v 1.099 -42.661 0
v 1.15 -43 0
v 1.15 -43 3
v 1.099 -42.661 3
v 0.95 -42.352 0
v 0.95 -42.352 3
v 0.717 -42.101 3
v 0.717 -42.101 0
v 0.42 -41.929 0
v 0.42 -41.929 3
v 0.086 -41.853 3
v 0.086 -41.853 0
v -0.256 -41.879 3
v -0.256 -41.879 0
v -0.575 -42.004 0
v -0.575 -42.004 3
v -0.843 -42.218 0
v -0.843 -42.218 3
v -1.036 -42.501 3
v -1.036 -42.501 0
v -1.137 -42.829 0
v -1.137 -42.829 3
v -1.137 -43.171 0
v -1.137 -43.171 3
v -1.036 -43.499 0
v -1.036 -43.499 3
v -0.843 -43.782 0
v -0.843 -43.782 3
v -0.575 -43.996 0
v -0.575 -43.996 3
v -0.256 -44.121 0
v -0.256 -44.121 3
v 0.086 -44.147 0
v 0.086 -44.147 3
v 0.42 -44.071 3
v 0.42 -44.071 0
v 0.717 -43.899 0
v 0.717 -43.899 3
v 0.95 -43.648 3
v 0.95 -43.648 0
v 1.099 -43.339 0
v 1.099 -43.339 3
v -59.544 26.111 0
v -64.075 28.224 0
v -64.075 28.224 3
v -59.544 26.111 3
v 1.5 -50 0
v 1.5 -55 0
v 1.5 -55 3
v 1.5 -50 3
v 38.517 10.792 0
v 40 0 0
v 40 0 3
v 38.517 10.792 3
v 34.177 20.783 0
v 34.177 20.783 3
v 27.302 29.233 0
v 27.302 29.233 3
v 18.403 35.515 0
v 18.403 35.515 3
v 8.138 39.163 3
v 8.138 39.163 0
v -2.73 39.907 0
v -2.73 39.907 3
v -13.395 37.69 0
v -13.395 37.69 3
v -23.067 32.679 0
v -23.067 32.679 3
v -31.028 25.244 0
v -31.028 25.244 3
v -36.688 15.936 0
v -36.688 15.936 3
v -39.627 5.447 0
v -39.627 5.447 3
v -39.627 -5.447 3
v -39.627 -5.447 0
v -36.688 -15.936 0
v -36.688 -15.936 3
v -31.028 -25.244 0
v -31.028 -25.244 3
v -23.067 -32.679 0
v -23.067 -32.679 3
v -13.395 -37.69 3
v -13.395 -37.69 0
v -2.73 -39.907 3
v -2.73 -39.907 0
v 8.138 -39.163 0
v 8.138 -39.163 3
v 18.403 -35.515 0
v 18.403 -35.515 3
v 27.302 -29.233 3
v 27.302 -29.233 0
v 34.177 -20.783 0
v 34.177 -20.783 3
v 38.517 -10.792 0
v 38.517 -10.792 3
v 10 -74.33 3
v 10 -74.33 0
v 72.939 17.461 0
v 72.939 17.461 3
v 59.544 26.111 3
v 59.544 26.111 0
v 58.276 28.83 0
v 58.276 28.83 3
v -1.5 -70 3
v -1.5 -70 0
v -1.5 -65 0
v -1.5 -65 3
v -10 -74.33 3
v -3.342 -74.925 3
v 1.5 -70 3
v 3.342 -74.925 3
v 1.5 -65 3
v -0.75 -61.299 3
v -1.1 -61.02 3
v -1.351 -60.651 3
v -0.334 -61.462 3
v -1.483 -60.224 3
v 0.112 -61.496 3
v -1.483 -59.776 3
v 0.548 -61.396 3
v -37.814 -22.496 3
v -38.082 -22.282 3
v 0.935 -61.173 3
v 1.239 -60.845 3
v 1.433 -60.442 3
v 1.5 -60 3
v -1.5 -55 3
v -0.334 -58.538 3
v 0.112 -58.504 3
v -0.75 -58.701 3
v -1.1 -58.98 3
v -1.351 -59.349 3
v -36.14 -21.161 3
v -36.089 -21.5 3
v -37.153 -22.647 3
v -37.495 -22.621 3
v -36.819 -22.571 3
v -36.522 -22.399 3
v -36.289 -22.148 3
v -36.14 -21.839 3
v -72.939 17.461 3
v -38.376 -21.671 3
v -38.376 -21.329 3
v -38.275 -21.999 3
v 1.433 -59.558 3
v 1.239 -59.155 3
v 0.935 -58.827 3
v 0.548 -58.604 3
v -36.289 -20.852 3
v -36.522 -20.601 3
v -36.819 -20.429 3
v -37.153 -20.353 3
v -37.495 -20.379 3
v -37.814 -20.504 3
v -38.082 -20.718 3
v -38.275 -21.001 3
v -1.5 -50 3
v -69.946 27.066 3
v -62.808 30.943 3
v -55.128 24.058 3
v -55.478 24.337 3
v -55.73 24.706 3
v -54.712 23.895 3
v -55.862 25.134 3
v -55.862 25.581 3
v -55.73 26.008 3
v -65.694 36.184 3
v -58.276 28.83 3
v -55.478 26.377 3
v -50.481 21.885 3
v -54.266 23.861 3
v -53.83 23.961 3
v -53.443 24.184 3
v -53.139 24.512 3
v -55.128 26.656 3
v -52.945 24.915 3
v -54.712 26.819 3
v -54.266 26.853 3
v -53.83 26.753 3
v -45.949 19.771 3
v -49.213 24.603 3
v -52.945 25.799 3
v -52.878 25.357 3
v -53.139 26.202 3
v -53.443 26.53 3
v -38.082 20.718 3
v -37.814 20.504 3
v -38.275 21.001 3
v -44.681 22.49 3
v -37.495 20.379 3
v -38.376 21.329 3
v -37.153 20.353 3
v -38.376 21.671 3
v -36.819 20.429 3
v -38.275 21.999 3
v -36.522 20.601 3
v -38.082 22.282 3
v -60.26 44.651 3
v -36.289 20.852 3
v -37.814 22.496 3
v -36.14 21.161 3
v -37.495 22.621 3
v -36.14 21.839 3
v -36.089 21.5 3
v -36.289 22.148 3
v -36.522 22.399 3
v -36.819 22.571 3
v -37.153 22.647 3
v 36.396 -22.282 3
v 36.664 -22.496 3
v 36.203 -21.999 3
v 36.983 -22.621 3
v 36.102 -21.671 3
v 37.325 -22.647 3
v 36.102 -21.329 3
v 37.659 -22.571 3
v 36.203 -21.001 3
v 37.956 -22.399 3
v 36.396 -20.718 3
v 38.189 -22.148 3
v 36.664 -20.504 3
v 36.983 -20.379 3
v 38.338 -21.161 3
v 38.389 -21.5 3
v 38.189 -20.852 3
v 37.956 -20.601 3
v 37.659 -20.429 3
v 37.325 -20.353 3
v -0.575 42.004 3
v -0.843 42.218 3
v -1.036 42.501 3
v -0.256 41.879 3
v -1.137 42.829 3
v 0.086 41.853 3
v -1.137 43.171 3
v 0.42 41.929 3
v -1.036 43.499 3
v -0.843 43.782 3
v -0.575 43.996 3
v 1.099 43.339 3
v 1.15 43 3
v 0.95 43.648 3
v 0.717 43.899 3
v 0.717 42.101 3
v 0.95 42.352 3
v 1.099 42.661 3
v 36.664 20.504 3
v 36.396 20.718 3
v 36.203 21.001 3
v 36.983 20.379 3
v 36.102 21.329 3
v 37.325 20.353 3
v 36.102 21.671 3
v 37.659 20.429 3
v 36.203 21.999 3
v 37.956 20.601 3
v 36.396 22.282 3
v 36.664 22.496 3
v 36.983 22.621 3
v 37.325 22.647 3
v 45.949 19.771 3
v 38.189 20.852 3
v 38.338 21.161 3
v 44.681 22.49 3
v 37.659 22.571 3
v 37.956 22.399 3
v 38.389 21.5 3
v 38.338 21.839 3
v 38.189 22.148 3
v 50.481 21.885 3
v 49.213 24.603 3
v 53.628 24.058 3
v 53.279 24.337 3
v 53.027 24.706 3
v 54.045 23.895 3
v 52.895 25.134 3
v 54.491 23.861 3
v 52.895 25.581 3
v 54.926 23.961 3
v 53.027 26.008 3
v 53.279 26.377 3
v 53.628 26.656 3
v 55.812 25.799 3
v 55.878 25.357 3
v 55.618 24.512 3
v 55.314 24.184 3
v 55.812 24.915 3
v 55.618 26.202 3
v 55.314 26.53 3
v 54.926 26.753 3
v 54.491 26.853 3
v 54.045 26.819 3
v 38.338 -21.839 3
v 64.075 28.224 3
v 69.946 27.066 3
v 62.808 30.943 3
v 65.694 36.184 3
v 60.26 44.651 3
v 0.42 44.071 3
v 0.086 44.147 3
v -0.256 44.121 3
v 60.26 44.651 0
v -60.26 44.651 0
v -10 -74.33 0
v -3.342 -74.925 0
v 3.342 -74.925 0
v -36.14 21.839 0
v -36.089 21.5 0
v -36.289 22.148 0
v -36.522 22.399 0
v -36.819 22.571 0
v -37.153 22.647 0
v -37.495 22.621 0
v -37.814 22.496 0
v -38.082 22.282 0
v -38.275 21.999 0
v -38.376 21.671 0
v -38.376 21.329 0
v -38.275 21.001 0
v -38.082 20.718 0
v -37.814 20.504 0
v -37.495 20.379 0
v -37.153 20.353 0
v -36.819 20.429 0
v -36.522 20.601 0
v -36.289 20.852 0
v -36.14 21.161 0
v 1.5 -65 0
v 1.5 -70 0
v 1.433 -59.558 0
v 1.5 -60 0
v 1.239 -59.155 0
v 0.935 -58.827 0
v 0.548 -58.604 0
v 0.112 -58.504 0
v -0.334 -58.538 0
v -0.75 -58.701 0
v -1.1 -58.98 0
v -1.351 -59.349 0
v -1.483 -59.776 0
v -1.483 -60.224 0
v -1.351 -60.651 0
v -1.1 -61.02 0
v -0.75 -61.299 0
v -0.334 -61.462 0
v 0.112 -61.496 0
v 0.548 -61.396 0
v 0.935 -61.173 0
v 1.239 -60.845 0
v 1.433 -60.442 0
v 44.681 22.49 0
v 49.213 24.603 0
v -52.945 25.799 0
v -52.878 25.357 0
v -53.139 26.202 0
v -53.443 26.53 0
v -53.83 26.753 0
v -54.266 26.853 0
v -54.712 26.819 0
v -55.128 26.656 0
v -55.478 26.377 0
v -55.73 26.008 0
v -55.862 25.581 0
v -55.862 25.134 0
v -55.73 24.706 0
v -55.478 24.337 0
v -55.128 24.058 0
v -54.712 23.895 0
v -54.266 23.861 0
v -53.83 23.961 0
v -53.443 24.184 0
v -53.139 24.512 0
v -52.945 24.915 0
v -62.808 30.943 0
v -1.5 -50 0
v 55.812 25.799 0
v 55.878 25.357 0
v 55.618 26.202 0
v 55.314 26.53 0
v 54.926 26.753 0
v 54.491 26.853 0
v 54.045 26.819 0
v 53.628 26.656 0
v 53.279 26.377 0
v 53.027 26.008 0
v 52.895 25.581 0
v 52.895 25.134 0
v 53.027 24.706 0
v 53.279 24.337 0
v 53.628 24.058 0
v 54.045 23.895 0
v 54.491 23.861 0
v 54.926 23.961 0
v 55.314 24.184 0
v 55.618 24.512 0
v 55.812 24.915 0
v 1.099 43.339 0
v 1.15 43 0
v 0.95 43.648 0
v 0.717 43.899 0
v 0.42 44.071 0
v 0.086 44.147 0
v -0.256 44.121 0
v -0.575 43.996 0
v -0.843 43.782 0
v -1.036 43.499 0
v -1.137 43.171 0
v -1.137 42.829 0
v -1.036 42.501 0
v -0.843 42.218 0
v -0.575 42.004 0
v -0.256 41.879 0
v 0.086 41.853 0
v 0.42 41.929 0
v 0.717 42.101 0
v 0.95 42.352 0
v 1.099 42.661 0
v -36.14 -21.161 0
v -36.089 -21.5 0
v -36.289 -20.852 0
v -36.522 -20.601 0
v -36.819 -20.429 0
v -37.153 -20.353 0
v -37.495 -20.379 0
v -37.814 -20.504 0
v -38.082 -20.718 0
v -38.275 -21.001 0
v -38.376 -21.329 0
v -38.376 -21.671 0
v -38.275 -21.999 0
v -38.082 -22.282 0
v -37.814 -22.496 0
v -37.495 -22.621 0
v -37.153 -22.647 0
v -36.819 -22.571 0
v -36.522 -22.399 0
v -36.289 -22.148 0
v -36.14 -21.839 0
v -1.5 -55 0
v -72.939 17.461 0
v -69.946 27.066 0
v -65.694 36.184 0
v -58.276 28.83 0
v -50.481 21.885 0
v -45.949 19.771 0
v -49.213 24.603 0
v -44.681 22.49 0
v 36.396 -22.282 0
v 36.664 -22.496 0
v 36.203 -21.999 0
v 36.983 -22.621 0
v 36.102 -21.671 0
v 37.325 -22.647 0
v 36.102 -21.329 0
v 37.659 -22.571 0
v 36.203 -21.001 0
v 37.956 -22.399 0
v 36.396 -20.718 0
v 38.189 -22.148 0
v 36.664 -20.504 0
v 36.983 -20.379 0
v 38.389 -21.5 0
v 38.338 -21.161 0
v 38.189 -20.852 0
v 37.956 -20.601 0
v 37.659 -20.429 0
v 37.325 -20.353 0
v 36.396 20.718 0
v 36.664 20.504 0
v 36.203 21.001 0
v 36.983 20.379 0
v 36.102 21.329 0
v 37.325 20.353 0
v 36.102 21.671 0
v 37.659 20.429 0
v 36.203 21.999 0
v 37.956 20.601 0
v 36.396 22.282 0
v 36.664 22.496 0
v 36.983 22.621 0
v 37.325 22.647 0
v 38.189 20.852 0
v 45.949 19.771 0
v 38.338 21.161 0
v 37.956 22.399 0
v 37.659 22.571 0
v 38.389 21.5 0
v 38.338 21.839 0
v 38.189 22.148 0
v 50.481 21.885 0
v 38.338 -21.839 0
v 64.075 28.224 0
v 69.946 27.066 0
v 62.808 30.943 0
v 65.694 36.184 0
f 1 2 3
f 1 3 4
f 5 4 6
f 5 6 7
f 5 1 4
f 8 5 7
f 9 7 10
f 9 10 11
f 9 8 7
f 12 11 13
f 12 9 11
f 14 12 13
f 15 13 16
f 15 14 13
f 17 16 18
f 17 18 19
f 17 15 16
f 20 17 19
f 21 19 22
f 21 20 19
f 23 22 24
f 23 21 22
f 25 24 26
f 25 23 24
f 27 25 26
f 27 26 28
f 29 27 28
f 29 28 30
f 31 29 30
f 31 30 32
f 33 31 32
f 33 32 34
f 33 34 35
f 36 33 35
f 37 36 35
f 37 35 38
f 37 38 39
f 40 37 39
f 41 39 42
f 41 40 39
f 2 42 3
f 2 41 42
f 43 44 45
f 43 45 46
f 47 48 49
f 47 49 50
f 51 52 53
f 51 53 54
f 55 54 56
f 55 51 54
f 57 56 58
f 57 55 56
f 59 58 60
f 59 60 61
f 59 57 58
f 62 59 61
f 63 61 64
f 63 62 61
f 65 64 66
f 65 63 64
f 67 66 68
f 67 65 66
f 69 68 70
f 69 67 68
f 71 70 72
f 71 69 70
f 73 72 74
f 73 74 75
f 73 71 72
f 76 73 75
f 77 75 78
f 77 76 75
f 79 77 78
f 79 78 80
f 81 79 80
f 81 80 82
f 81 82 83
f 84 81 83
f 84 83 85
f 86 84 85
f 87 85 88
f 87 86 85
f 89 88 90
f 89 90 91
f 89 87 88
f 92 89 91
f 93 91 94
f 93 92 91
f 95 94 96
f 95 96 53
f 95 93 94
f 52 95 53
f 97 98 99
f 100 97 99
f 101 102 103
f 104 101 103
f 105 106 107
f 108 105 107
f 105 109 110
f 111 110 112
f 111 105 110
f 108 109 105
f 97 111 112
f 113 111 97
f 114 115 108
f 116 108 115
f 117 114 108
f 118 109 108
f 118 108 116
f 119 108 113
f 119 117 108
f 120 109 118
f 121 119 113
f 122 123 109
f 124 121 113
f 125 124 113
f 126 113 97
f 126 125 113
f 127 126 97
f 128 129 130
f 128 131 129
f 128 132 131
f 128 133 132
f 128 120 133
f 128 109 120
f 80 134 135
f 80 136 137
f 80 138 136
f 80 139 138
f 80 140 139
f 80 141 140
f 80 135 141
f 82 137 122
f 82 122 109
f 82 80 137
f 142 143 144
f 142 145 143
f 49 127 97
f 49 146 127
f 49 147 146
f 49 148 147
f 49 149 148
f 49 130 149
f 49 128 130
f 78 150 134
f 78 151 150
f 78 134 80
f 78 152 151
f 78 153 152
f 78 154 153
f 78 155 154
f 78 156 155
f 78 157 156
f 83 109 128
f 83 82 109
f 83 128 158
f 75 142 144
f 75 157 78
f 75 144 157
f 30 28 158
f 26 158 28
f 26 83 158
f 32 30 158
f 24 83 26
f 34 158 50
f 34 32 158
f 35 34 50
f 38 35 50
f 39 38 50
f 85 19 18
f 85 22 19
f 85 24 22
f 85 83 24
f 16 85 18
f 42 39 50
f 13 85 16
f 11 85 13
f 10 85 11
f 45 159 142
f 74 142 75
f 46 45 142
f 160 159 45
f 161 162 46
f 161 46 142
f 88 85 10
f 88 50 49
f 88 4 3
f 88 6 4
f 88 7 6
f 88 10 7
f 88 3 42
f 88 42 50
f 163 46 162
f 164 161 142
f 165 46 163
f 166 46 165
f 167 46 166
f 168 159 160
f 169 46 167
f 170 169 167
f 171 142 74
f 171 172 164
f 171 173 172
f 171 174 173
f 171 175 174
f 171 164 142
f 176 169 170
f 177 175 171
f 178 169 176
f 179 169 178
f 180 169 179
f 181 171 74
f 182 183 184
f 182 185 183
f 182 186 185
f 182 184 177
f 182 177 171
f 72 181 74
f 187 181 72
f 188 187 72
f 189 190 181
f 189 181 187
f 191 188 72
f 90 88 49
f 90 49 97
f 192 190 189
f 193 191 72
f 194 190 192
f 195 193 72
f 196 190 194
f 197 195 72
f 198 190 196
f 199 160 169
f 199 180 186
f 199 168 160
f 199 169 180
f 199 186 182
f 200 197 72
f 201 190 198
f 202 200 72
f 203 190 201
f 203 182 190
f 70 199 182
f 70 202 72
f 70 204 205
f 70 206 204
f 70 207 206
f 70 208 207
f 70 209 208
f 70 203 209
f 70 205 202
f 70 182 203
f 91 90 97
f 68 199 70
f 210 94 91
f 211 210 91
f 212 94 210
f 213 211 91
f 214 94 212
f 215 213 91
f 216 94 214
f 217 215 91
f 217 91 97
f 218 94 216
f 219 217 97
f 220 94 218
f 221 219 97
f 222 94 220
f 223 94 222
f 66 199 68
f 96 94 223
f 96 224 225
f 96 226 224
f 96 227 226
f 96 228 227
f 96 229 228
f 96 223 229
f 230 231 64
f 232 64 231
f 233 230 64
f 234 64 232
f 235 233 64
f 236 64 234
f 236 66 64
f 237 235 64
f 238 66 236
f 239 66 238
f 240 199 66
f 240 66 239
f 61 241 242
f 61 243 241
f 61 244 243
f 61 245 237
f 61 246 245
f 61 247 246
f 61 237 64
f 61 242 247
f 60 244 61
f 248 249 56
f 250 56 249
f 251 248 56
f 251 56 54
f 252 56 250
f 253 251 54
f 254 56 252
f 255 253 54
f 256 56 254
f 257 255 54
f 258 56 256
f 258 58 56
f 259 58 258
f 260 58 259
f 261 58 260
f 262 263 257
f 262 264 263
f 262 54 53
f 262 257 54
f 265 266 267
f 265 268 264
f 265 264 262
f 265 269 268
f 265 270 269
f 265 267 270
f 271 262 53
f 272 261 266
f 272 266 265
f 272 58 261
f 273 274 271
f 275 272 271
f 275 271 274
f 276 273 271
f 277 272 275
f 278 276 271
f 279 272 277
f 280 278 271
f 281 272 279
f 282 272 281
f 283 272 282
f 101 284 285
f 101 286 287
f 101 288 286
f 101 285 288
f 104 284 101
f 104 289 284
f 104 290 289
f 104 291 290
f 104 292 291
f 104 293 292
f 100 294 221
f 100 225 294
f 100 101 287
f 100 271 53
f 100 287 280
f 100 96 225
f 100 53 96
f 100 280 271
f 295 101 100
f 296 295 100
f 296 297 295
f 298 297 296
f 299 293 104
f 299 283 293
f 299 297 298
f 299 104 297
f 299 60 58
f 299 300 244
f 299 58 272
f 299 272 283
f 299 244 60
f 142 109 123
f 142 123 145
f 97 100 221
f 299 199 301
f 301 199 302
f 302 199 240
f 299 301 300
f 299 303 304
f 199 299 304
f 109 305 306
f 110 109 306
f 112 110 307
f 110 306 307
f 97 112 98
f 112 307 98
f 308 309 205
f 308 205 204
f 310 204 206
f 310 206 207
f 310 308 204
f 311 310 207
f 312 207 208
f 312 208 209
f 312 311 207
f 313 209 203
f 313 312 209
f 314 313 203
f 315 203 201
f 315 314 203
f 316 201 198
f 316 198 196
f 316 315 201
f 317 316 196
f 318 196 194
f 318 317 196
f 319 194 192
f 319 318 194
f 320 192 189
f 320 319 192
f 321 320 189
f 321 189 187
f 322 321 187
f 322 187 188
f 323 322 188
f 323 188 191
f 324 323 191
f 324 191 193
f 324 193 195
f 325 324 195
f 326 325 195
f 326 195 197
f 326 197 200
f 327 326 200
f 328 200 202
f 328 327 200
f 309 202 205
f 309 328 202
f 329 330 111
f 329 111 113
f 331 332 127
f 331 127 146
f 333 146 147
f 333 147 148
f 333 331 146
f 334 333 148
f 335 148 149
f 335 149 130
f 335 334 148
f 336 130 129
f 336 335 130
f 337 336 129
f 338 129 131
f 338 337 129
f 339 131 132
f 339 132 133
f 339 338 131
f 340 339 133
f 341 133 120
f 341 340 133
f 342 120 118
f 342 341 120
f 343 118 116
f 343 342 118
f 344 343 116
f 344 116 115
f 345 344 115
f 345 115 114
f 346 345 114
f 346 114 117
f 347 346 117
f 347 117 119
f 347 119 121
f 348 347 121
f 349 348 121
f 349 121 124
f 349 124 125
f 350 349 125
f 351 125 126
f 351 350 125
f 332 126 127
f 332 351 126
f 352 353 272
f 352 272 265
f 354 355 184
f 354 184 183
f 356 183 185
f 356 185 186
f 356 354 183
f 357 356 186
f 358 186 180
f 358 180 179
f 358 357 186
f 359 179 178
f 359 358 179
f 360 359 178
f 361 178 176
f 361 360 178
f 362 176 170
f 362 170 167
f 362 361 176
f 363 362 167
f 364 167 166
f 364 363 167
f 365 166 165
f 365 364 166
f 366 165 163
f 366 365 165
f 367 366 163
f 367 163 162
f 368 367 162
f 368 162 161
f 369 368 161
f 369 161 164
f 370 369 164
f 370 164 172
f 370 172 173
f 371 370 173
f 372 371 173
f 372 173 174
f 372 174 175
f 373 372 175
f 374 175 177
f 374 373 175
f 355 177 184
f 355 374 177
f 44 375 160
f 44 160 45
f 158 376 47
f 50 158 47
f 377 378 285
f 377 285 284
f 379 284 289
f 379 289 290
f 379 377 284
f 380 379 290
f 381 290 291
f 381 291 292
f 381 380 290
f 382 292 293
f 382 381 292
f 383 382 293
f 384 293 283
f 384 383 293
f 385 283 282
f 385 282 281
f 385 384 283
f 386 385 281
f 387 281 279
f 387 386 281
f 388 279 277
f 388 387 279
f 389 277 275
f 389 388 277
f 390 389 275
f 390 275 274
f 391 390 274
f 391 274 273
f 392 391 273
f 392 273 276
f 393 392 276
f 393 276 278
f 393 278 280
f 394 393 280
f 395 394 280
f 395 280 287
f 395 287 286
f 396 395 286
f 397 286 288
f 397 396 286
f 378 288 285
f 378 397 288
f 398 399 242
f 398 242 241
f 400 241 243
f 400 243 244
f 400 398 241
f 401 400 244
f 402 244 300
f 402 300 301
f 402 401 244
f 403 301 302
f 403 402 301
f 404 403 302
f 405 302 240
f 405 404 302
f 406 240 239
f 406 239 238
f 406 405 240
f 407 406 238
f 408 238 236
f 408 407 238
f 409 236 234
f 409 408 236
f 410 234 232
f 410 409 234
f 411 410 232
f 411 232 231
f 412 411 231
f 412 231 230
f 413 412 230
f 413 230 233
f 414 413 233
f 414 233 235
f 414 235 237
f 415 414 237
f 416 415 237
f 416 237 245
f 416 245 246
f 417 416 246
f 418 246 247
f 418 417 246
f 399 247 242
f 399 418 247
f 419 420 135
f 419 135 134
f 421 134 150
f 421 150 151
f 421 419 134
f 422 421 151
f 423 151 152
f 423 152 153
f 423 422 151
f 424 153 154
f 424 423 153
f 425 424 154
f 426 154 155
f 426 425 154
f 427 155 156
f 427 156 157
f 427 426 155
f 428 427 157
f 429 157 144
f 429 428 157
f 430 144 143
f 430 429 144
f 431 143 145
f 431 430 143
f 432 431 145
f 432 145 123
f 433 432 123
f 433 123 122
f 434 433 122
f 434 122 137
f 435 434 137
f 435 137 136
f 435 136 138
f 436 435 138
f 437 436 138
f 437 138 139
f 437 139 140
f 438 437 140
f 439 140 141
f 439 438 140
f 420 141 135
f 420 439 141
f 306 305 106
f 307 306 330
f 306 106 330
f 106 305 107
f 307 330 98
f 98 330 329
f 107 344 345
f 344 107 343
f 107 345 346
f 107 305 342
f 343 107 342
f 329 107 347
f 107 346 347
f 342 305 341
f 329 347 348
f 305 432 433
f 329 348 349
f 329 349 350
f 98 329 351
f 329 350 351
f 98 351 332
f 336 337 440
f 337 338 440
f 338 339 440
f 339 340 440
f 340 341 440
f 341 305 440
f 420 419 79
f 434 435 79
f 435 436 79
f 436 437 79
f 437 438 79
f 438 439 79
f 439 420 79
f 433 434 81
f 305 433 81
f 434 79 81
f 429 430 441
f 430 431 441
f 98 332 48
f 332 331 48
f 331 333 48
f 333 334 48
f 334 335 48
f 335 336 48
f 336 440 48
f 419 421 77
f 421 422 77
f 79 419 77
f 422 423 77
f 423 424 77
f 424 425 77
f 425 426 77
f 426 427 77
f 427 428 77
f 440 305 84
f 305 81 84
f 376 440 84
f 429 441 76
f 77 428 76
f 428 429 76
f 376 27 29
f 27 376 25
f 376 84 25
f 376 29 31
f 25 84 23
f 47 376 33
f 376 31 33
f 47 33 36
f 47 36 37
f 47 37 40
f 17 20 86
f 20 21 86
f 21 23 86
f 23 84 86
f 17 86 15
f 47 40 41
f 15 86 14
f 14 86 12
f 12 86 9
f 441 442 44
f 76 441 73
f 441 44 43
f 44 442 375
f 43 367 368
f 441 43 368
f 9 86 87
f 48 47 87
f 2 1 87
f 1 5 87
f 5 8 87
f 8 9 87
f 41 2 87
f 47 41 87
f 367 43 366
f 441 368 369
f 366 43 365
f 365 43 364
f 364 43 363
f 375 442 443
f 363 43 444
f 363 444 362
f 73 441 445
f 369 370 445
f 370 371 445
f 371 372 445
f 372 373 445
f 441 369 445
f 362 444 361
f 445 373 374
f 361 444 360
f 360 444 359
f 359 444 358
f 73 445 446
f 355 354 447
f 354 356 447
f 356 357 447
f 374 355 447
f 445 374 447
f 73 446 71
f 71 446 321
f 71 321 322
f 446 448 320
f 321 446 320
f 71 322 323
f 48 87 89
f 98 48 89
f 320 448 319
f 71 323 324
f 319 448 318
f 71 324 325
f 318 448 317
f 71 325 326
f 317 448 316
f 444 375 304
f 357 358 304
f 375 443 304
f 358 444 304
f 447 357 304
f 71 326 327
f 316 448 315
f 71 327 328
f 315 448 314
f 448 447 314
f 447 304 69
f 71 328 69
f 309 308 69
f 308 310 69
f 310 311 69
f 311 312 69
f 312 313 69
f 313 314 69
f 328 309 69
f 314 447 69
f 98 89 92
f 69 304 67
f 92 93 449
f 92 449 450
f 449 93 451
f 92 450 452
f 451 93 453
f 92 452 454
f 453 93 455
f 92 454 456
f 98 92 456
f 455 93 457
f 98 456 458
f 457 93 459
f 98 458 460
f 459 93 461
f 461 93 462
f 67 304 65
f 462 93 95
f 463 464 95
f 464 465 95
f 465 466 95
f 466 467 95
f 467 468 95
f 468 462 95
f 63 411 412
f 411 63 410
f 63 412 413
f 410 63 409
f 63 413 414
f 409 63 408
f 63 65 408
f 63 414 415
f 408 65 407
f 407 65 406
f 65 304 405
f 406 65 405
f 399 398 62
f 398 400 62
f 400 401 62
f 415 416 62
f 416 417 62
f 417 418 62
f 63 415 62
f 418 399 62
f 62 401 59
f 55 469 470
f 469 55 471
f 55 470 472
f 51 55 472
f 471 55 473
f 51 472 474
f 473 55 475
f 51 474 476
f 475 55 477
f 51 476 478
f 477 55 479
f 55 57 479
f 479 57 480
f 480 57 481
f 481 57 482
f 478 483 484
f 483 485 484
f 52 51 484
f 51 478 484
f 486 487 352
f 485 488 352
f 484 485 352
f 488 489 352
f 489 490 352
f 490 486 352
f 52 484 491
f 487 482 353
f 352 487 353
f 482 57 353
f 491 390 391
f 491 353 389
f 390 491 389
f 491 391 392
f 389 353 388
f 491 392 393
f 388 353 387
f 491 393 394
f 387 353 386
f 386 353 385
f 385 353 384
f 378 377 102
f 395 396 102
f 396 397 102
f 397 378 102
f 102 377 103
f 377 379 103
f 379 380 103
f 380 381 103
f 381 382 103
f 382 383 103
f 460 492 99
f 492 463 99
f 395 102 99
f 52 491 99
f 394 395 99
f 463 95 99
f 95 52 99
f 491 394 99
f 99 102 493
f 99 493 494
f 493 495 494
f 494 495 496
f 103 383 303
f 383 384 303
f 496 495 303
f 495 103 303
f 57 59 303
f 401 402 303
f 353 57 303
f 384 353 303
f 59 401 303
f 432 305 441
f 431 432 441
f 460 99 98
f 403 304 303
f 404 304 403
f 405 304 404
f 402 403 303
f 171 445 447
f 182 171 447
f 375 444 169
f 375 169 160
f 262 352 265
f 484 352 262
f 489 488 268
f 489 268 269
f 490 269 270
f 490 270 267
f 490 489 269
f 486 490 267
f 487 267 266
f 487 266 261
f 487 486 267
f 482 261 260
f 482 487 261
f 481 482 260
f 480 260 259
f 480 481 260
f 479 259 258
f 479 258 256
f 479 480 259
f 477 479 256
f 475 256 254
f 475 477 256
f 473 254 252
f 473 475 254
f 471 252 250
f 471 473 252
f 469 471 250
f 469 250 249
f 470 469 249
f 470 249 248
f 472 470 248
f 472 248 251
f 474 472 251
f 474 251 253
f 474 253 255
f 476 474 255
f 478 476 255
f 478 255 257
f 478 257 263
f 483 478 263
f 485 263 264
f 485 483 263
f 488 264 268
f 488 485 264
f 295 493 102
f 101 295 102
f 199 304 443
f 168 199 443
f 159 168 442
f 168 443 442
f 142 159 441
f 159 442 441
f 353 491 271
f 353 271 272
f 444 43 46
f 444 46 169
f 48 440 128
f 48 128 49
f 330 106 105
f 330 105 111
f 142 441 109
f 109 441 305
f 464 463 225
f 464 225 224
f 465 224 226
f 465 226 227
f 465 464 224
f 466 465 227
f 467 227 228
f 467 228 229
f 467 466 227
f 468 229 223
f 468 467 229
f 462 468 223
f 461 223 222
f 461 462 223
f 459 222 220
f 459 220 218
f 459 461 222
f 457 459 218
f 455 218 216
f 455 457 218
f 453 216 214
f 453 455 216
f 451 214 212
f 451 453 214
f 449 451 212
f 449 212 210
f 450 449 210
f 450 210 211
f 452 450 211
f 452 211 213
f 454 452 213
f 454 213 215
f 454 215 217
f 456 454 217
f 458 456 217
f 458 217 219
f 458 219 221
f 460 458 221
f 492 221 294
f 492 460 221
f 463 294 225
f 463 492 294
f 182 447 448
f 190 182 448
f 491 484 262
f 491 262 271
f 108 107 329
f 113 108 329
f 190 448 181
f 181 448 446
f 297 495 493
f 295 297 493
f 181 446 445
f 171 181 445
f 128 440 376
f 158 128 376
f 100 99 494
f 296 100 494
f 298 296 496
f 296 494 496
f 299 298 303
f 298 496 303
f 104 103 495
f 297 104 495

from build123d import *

# Parameters (mm, degrees)
SKETCH1_R           = 40
SKETCH1_R_2         = 1.15
SKETCH1_R_3         = 1.5
SKETCH1_W           = 3
SKETCH1_H           = 5
BOSS_EXTRUDE1_DEPTH = 3


with BuildPart() as part:
    # Sketch1 → Boss-Extrude1 (new body)
    with BuildSketch(Plane.XY):
        with BuildLine():
            Line((-72.939022771, 17.461356112), (-10, -74.330343737))
            ThreePointArc((-10, -74.330343737), (0, -75), (10, -74.330343737))
            Line((10, -74.330343737), (72.939022771, 17.461356112))
            ThreePointArc((72.939022771, 17.461356112), (67.973084028, 31.696369631), (60.260474918, 44.650589723))
            Line((60.260474918, 44.650589723), (-60.260474918, 44.650589723))
            ThreePointArc((-60.260474918, 44.650589723), (-67.973084028, 31.696369631), (-72.939022771, 17.461356112))
        make_face()
        Circle(SKETCH1_R, mode=Mode.SUBTRACT)
        with Locations((0, -43)):
            Circle(SKETCH1_R_2, mode=Mode.SUBTRACT)
        with Locations((-37.239092363, -21.5)):
            Circle(SKETCH1_R_2, mode=Mode.SUBTRACT)
        with Locations((-37.239092363, 21.5)):
            Circle(SKETCH1_R_2, mode=Mode.SUBTRACT)
        with Locations((0, 43)):
            Circle(SKETCH1_R_2, mode=Mode.SUBTRACT)
        with Locations((37.239092363, 21.5)):
            Circle(SKETCH1_R_2, mode=Mode.SUBTRACT)
        with Locations((37.239092363, -21.5)):
            Circle(SKETCH1_R_2, mode=Mode.SUBTRACT)
        with Locations((0, -60)):
            Circle(SKETCH1_R_3, mode=Mode.SUBTRACT)
        with Locations((54.378467222, 25.357095704)):
            Circle(SKETCH1_R_3, mode=Mode.SUBTRACT)
        with Locations((-54.378467222, 25.357095704)):
            Circle(SKETCH1_R_3, mode=Mode.SUBTRACT)
        with Locations((0, -52.5)):
            Rectangle(SKETCH1_W, SKETCH1_H, mode=Mode.SUBTRACT)
        with Locations((0, -67.5)):
            Rectangle(SKETCH1_W, SKETCH1_H, mode=Mode.SUBTRACT)
        Polygon((49.213000894, 24.603466076), (44.681461959, 22.490374768), (45.949316744, 19.771451406), (50.48085568, 21.884542715), align=None, mode=Mode.SUBTRACT)
        Polygon((58.276078765, 28.829648694), (62.8076177, 30.942740002), (64.075472485, 28.223816641), (59.54393355, 26.110725333), align=None, mode=Mode.SUBTRACT)
        Polygon((-58.276078765, 28.829648694), (-62.8076177, 30.942740002), (-64.075472485, 28.223816641), (-59.54393355, 26.110725333), align=None, mode=Mode.SUBTRACT)
        Polygon((-49.213000894, 24.603466076), (-44.681461959, 22.490374768), (-45.949316744, 19.771451406), (-50.48085568, 21.884542715), align=None, mode=Mode.SUBTRACT)
    extrude(amount=BOSS_EXTRUDE1_DEPTH)


solid = part.part
